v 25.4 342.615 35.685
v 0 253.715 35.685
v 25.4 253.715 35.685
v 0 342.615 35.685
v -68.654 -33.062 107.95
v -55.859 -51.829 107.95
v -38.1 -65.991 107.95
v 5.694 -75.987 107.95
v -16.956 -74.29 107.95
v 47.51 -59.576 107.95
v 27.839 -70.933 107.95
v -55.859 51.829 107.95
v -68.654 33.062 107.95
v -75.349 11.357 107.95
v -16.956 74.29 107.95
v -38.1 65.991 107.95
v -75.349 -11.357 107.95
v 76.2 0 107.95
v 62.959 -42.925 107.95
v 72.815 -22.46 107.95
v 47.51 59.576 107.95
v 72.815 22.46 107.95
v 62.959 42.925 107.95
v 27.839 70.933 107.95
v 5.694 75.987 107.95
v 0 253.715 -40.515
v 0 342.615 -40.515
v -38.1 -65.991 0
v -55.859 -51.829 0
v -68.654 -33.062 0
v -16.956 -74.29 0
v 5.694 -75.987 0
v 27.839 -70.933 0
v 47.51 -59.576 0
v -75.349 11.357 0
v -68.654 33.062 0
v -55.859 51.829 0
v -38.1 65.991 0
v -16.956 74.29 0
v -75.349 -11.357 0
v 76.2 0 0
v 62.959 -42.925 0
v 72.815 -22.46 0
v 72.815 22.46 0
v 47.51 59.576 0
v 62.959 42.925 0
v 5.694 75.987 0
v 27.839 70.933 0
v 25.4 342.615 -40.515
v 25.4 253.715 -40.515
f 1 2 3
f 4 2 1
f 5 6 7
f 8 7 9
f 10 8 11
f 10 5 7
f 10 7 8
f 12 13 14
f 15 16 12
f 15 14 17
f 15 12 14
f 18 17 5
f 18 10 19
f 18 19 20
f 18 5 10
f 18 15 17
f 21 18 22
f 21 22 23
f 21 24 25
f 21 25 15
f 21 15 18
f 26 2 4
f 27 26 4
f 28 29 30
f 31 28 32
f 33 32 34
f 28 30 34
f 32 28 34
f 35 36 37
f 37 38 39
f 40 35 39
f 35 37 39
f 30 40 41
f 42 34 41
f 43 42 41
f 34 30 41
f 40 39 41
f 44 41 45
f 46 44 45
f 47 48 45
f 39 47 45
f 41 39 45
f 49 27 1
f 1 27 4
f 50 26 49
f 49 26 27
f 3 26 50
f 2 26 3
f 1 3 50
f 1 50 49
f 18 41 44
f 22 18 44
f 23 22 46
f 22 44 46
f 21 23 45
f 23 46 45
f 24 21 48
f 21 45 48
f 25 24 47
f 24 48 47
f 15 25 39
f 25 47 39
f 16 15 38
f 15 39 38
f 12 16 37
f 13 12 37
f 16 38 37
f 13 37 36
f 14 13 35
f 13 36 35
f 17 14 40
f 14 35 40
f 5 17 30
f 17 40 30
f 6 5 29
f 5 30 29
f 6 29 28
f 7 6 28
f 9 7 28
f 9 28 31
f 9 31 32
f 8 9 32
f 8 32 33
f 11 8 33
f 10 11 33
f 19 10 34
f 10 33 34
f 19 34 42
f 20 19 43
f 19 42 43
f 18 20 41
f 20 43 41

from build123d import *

# Parameters (mm, degrees)
F0_R     = 76.2
F1_DEPTH = 107.95
F2_W     = 88.9
F2_H     = 76.2
F3_DEPTH = 25.4


with BuildPart() as f1:
    # F0 (on Top) → F1 (new body)
    with BuildSketch(Plane.XY):
        Circle(F0_R)
    extrude(amount=F1_DEPTH)


with BuildPart() as f3:
    # F2 (on Right) → F3 (new body)
    with BuildSketch(Plane.YZ):
        with Locations((298.164604, -2.414942)):
            Rectangle(F2_W, F2_H)
    extrude(amount=F3_DEPTH)


solid = Compound([f1.part, f3.part])
